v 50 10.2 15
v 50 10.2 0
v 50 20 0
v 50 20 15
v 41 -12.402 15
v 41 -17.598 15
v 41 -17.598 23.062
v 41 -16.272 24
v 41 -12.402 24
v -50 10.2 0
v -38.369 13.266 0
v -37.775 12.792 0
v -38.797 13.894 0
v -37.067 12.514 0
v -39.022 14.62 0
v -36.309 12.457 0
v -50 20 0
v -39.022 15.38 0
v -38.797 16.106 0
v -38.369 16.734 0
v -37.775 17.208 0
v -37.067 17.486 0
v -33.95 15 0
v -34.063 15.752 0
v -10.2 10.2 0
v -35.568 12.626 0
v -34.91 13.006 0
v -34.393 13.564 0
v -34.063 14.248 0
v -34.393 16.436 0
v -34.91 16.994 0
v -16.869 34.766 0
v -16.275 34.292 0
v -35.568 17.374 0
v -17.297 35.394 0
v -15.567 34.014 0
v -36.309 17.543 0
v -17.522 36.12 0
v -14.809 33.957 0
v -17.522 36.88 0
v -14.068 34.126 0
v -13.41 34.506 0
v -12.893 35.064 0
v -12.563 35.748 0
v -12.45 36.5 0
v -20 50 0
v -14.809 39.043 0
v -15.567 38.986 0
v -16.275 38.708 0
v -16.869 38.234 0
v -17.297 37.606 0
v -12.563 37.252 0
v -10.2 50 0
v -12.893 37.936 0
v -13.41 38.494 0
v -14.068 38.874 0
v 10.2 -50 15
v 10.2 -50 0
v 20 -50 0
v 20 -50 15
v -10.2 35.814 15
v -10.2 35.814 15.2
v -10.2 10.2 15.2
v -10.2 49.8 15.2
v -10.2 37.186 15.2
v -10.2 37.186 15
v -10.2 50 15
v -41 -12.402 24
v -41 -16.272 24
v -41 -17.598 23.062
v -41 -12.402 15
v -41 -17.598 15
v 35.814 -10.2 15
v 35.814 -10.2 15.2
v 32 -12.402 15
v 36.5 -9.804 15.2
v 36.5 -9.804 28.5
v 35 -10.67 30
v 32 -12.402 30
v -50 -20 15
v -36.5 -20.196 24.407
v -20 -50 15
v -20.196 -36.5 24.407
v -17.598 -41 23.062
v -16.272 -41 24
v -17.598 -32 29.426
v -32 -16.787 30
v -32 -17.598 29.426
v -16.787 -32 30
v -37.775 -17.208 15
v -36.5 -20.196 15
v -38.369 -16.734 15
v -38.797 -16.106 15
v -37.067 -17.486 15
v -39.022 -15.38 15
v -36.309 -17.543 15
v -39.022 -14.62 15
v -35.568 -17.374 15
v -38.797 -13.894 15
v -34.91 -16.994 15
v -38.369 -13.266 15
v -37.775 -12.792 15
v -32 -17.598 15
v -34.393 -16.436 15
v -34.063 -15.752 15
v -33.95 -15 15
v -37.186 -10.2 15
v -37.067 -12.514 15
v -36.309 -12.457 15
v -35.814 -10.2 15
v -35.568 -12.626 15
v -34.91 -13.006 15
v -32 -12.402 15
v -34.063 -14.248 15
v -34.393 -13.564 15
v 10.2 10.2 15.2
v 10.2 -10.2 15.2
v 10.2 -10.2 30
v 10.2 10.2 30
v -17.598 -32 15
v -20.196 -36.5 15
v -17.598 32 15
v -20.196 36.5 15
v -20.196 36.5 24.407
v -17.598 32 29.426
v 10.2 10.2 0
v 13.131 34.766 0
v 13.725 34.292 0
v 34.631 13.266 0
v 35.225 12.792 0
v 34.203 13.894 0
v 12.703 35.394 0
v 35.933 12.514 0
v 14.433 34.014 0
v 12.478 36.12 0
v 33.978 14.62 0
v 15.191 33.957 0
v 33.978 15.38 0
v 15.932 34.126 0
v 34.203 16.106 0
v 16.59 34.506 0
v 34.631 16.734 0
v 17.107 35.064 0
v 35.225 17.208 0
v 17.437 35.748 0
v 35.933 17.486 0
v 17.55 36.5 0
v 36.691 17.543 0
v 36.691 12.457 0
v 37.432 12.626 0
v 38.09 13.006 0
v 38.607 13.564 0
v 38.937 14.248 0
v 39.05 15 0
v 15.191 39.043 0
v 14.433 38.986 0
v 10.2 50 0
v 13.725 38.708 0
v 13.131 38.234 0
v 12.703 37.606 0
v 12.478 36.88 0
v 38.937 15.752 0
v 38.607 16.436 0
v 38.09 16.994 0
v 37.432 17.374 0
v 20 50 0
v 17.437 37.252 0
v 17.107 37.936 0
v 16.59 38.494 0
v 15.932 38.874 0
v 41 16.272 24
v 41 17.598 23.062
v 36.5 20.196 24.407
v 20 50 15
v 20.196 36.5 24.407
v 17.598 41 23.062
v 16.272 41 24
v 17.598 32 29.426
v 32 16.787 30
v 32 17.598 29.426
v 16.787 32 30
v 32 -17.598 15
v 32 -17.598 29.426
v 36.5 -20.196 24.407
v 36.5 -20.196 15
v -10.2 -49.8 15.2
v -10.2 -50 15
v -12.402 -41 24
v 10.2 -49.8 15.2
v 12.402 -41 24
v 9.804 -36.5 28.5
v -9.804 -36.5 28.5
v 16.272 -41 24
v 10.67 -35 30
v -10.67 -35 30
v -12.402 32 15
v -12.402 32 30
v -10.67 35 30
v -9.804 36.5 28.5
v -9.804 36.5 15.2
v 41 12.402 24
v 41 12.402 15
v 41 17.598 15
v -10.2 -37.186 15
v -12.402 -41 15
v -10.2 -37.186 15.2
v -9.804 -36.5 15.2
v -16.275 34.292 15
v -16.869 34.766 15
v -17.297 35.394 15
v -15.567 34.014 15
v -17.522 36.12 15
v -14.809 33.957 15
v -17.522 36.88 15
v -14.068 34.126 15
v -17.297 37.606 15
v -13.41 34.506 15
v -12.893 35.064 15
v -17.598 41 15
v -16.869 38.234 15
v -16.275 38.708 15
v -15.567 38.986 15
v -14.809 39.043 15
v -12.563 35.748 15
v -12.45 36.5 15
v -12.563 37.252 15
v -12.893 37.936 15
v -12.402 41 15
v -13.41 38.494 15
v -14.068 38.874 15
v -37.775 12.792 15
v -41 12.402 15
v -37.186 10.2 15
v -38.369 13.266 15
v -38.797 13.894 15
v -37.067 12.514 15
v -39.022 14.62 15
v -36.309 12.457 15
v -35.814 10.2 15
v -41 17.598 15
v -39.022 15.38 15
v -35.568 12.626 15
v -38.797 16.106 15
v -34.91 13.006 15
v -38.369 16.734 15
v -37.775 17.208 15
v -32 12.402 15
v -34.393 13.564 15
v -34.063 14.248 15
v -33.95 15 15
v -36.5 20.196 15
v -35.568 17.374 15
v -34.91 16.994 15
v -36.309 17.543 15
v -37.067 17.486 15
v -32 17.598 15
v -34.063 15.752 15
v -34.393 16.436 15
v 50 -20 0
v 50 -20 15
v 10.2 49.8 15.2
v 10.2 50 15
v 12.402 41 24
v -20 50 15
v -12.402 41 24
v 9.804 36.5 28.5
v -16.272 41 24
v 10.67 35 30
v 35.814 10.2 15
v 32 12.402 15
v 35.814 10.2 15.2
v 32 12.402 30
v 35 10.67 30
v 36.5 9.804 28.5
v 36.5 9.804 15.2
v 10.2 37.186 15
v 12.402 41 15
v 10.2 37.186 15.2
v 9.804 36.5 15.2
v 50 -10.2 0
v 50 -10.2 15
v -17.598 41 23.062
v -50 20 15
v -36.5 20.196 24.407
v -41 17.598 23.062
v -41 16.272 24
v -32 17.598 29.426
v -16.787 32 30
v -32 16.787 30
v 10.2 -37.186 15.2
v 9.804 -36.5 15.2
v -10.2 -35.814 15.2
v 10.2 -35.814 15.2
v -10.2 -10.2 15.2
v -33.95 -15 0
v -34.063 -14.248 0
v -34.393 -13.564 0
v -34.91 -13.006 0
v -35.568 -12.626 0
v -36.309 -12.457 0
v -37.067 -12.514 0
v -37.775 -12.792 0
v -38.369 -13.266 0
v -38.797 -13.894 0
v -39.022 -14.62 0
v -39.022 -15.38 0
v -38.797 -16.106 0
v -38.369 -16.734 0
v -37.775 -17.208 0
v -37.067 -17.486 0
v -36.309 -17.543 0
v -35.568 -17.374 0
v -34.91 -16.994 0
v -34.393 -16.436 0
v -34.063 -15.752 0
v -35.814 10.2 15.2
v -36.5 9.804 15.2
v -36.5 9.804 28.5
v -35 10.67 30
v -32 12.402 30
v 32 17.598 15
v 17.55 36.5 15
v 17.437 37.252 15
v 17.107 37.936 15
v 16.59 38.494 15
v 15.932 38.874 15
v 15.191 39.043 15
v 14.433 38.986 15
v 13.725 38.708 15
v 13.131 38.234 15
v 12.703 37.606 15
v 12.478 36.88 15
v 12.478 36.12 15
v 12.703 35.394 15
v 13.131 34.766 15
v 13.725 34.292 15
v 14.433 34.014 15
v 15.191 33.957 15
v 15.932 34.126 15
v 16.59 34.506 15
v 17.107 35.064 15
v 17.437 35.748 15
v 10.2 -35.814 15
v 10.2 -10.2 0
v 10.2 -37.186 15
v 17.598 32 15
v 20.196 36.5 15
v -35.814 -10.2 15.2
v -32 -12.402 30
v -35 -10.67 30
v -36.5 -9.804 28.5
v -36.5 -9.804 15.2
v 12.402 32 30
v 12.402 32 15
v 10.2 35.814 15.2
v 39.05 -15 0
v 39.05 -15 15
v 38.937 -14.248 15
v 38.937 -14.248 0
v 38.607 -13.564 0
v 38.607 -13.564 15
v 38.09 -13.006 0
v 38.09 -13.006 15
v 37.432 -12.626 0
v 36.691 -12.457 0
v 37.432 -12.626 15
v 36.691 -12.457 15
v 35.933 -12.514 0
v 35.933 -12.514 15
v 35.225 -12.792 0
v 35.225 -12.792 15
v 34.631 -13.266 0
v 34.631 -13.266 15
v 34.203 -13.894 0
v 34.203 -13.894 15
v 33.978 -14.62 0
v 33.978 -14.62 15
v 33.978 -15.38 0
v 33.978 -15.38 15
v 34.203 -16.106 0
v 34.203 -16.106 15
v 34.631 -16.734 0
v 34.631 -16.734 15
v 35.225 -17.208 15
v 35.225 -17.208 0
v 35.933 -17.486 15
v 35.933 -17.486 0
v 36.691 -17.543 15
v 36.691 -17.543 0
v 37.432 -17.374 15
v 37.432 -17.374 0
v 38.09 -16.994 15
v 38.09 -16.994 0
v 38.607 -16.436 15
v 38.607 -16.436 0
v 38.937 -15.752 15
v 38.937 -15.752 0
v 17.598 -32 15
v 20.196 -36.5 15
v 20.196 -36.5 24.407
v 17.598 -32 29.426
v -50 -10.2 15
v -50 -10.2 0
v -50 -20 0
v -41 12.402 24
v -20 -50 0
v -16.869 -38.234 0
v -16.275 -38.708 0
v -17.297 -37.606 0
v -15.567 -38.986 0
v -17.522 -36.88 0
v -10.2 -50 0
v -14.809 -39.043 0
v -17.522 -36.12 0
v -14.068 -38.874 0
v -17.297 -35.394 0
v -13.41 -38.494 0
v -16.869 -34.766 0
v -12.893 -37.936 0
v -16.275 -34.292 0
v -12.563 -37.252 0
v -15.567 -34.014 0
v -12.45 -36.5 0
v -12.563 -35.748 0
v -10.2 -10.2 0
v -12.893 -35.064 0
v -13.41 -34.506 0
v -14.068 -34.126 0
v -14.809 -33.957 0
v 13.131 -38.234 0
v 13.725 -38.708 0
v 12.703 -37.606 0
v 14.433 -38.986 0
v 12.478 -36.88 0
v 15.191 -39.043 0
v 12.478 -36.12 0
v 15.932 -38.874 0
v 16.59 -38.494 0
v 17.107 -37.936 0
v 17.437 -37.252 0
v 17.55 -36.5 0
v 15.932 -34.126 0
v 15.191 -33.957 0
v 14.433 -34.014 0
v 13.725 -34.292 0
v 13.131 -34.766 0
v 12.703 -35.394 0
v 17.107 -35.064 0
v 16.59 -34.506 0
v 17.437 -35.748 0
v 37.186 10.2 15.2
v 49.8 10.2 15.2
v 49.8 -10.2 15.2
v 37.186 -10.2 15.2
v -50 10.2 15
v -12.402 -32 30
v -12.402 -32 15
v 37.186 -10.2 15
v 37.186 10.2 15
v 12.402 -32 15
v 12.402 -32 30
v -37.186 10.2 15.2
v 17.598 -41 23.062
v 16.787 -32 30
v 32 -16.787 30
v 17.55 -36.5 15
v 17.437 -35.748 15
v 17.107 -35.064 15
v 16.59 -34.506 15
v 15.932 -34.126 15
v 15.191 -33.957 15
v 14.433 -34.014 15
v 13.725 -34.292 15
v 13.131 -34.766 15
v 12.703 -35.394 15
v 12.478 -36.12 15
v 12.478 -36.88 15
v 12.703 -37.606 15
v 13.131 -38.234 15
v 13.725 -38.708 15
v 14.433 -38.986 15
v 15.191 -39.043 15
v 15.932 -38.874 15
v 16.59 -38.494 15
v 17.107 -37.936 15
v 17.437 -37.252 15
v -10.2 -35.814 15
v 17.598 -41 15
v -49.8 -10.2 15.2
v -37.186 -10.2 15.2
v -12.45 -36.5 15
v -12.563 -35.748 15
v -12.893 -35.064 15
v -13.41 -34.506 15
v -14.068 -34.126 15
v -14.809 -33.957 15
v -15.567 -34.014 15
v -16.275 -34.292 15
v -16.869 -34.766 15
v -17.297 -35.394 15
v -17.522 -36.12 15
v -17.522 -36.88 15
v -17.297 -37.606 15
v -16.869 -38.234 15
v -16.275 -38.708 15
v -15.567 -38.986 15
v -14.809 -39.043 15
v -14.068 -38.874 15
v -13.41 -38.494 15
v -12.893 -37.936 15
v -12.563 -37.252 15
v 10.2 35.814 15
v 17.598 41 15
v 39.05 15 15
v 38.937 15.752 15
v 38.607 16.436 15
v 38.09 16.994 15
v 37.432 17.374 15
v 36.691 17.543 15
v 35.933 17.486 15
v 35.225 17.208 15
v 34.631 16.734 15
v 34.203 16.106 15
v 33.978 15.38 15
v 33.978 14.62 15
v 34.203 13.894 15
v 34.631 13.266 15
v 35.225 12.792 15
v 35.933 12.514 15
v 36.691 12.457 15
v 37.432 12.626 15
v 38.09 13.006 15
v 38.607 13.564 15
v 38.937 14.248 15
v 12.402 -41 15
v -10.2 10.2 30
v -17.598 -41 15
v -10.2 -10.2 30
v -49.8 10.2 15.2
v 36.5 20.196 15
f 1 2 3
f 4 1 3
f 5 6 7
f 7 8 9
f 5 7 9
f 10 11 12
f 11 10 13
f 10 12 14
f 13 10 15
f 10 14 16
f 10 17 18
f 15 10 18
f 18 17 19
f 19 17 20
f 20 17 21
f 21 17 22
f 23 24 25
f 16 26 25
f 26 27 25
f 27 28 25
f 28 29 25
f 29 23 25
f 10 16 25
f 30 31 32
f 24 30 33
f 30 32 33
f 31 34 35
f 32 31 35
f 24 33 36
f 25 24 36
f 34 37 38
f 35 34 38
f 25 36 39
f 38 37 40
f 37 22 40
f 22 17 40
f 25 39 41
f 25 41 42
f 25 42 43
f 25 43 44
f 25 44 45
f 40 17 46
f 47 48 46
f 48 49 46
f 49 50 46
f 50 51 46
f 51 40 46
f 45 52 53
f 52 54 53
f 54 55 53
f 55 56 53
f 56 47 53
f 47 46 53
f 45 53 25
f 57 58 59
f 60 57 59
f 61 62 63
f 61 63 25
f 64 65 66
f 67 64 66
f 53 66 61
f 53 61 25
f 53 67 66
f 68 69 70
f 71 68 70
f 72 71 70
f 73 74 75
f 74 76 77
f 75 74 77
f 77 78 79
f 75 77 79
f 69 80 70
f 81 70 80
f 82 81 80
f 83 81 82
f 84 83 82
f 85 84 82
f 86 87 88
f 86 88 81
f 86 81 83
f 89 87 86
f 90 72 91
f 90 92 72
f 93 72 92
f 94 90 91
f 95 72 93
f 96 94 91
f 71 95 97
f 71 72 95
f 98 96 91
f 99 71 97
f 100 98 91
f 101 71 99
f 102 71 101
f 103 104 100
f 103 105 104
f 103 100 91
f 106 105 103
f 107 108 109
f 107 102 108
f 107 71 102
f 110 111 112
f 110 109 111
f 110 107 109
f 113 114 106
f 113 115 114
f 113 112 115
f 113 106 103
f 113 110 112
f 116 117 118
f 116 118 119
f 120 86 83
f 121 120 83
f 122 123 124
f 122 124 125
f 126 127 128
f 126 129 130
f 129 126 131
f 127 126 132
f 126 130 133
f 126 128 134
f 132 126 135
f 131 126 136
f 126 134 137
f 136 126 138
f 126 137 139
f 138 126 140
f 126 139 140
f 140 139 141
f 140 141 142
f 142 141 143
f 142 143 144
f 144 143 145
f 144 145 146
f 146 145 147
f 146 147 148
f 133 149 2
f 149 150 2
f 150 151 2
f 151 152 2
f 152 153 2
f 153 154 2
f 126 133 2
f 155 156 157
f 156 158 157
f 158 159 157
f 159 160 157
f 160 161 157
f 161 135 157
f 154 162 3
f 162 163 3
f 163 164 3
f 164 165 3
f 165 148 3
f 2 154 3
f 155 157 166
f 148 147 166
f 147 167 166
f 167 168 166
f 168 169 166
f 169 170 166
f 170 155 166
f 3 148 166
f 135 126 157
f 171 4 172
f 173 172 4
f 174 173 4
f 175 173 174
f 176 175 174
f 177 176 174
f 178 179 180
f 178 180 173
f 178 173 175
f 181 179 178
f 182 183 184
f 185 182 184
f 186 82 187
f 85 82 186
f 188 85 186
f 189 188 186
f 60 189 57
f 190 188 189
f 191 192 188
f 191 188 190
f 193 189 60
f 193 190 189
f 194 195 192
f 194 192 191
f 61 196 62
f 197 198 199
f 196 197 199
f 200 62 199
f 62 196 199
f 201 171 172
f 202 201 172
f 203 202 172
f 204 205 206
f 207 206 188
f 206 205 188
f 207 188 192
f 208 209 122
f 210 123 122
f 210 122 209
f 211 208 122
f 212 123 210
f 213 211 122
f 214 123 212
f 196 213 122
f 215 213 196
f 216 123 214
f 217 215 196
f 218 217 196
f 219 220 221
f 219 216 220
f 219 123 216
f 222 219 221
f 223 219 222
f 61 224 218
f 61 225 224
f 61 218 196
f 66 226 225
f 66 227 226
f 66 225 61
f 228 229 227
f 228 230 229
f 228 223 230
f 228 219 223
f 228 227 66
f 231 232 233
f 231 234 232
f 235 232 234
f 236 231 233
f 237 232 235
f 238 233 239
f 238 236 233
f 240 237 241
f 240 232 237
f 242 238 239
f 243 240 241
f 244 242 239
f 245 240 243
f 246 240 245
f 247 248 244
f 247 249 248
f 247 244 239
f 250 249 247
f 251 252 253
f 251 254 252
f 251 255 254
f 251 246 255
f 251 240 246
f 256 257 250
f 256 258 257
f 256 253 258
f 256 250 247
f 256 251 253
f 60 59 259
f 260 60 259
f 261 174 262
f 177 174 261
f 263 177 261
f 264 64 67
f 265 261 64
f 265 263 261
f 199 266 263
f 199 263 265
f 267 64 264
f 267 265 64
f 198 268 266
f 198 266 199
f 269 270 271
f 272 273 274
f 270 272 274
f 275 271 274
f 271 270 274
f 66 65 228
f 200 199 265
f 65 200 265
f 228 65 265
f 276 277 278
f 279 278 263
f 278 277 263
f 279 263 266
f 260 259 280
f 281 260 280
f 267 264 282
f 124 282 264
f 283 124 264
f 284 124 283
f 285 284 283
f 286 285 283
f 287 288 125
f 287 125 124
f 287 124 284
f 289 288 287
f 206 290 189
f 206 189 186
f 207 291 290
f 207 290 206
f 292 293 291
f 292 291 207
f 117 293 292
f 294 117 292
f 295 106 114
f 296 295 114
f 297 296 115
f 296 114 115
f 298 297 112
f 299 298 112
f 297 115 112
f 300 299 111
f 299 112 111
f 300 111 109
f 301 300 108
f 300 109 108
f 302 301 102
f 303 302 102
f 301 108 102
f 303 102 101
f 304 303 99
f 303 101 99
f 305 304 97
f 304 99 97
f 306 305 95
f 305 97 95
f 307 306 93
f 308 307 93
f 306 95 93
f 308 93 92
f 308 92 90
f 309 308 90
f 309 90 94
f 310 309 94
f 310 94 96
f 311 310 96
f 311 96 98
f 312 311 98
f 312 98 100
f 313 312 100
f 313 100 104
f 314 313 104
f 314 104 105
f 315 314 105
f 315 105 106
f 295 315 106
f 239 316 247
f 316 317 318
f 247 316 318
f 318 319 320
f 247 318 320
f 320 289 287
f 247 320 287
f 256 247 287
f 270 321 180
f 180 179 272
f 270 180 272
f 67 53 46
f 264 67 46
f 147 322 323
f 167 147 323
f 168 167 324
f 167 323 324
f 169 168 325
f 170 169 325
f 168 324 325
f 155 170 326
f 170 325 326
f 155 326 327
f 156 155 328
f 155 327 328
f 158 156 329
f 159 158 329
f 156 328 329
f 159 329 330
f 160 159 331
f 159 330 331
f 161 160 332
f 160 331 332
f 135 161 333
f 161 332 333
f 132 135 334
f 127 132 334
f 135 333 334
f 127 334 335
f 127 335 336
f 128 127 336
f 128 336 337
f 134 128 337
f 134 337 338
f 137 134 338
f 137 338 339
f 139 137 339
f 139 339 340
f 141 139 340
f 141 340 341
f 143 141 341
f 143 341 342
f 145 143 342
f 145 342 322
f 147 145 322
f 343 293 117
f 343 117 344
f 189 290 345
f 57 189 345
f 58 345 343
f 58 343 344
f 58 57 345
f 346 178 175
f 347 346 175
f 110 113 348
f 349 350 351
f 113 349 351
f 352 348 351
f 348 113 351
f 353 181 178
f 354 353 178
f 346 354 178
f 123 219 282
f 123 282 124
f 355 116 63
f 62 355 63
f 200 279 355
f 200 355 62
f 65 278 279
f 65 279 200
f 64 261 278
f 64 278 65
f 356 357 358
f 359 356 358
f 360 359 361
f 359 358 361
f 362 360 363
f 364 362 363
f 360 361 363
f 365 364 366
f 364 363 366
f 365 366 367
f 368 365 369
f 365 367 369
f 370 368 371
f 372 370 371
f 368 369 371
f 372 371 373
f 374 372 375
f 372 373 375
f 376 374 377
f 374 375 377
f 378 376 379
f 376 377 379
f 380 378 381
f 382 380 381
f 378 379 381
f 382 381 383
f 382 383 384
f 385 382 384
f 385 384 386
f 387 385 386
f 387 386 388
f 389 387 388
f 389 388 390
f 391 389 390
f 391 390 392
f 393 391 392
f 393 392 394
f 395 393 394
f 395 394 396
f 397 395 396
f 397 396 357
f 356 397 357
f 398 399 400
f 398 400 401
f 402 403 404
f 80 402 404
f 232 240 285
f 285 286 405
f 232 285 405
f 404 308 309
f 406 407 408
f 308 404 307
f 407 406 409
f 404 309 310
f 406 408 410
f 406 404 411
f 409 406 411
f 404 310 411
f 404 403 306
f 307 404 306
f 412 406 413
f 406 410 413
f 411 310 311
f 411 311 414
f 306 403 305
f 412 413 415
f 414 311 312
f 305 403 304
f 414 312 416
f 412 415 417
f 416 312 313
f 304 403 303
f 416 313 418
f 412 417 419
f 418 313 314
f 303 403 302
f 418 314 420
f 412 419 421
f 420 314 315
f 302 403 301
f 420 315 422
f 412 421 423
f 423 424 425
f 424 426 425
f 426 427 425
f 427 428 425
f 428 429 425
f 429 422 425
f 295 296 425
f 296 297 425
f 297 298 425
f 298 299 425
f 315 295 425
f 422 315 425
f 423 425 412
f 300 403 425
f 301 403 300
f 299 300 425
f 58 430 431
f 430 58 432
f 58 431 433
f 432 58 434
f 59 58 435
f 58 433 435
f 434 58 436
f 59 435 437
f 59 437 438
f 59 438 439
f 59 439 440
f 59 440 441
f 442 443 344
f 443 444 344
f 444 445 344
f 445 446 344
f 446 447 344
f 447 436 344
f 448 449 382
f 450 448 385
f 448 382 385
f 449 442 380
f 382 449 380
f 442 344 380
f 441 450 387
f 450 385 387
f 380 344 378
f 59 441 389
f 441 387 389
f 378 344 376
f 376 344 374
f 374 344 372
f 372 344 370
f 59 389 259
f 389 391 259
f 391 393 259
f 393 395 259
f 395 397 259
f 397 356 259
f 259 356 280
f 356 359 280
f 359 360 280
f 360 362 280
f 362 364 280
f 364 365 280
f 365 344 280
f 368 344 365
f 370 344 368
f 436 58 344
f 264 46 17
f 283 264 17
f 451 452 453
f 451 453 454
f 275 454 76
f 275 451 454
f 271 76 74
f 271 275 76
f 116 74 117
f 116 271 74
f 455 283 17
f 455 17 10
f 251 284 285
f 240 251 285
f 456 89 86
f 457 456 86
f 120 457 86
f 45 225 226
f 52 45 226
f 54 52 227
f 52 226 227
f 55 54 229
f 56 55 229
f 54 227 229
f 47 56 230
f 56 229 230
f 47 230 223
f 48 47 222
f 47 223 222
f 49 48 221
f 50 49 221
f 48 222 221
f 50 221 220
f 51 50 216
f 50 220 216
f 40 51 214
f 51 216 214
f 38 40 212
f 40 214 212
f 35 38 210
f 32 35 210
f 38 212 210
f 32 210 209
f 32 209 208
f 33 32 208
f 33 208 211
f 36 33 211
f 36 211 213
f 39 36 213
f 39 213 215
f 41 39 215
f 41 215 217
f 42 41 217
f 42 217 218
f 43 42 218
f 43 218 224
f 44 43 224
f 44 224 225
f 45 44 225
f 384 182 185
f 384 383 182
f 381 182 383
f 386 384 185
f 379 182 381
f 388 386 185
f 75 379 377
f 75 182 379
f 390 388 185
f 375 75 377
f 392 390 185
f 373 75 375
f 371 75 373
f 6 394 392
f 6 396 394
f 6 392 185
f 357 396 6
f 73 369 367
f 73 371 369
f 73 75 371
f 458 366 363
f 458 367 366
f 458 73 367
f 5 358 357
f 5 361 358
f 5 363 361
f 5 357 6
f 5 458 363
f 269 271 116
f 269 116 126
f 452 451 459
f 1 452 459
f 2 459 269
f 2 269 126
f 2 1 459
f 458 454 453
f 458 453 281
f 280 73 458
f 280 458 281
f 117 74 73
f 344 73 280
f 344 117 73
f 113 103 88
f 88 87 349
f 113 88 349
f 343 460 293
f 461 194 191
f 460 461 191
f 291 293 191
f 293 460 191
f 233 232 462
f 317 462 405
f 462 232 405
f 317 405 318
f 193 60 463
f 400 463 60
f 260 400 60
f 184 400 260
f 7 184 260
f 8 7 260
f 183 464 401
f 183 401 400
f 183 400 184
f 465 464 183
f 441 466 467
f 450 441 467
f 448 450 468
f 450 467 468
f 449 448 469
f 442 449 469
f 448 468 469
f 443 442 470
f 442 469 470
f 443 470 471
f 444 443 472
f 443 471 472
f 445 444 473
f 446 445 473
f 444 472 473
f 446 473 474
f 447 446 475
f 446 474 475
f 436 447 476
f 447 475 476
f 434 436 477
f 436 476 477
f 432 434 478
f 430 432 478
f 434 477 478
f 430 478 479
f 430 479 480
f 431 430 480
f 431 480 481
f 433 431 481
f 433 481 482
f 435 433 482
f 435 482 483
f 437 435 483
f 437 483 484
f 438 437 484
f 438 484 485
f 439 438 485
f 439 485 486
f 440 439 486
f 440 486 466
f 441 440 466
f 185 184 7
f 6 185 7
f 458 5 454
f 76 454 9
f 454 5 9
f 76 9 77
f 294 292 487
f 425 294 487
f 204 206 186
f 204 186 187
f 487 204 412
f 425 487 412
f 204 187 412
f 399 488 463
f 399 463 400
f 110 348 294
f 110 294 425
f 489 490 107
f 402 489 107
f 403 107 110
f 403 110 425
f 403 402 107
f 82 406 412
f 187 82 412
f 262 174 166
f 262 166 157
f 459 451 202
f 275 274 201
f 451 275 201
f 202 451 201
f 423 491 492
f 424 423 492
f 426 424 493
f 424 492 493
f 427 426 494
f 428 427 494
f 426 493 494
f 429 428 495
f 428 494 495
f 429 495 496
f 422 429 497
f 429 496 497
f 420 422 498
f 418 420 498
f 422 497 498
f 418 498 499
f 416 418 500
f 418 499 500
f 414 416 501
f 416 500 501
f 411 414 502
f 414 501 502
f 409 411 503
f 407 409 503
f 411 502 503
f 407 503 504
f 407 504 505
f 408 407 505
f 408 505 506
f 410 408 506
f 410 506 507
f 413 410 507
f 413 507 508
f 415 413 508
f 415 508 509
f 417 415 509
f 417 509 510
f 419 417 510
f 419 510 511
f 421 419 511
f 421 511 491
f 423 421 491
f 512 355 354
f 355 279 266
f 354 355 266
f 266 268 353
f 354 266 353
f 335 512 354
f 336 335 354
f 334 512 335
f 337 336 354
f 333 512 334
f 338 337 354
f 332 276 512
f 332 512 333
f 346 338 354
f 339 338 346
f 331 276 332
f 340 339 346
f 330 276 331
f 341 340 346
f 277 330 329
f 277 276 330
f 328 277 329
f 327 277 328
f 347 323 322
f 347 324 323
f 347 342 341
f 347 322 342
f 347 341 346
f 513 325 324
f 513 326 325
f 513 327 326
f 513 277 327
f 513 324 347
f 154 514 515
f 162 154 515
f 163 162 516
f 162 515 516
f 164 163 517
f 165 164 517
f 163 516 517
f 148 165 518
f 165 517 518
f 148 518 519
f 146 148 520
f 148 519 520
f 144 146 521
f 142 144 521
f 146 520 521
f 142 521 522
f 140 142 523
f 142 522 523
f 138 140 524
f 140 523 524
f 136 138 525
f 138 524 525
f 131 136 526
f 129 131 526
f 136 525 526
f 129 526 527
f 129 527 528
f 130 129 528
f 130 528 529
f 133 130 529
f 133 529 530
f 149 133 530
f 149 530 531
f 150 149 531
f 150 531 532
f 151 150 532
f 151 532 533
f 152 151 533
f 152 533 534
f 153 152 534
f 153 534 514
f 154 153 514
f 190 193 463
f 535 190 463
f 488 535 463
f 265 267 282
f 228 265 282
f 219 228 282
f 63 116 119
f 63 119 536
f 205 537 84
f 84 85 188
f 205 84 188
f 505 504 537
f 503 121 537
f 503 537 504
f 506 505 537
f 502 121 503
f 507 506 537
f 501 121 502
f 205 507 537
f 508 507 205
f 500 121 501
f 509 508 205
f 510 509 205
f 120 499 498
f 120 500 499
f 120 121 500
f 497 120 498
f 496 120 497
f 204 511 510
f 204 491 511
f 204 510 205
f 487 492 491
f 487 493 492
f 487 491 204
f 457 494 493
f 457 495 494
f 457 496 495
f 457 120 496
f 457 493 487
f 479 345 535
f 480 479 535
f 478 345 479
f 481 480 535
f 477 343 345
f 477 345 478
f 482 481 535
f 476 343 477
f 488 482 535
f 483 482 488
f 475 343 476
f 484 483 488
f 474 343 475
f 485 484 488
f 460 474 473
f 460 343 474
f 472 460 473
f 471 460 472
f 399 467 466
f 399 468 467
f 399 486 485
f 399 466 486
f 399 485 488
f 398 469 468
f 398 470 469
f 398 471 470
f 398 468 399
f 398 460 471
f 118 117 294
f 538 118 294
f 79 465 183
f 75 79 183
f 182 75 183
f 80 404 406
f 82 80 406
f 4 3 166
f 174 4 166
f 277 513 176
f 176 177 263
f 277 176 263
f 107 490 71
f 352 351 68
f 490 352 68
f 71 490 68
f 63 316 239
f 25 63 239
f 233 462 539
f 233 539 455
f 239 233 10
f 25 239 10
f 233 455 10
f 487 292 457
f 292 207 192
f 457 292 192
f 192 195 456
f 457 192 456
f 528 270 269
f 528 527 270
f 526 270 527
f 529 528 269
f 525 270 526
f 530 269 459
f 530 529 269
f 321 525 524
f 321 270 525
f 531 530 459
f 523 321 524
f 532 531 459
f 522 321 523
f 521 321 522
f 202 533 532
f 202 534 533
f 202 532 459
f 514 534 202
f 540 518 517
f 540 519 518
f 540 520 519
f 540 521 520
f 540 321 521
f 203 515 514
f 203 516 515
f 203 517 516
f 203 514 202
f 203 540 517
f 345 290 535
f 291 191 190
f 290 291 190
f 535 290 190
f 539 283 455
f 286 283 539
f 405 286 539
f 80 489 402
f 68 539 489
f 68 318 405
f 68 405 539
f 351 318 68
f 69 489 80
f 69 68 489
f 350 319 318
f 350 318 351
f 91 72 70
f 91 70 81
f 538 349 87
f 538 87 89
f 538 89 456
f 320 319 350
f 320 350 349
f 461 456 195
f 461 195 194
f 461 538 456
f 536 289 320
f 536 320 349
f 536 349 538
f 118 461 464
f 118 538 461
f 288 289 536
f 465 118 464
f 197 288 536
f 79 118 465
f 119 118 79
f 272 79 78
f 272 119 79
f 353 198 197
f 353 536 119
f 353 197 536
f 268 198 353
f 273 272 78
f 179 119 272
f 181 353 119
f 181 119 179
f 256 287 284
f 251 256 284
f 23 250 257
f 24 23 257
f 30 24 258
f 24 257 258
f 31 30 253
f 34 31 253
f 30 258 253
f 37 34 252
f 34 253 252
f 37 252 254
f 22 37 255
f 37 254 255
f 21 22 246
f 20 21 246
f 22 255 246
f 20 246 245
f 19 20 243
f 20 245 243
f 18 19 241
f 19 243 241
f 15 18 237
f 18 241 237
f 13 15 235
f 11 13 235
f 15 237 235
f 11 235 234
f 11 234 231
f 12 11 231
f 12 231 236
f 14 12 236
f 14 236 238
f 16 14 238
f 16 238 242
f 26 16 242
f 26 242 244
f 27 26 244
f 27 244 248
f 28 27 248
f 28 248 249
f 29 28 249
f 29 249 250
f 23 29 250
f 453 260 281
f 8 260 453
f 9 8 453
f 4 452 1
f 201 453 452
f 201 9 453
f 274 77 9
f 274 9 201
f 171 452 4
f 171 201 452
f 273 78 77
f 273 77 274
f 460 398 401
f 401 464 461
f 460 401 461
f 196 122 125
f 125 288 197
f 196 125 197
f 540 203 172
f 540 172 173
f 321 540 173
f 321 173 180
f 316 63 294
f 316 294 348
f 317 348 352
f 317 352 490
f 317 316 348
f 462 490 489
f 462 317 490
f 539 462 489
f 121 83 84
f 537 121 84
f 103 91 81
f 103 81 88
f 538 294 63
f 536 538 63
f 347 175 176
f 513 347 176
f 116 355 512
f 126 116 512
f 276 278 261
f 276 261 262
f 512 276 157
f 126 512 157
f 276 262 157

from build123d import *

# Parameters (mm, degrees)
EXTRUDE_1_DEPTH          = 30
CHAMFER_1_SIZE           = 15
SKETCH_2_W               = 15.2
SKETCH_2_H               = 20.4
CUT_EXTRUDE_1_DEPTH      = 50
SKETCH_3_R               = 2.55
CUT_EXTRUDE_2_DEPTH      = 77.811457479
CUT_EXTRUDE_3_DEPTH      = 15
PATTERN_CIRCULAR_1_COUNT = 4
SKETCH_6_W               = 20.4
SKETCH_6_H               = 20.4
CUT_EXTRUDE_4_DEPTH      = 73.325928961


with BuildPart() as part:
    # 스케치1 → 보스-돌출1 (new body)
    with BuildSketch(Plane.XY):
        Polygon((-20, 50), (-50, 20), (-50, -20), (-20, -50), (20, -50), (50, -20), (50, 20), (20, 50), align=None)
    extrude(amount=EXTRUDE_1_DEPTH)

    # 모따기1
    chamfer_1_edges = [part.edges().sort_by_distance(p)[0] for p in [
        (-50, 0, 30),
        (-35, -35, 30),
        (0, -50, 30),
        (35, -35, 30),
        (50, 0, 30),
        (35, 35, 30),
        (0, 50, 30),
        (-35, 35, 30),
    ]]
    chamfer(chamfer_1_edges, length=CHAMFER_1_SIZE)

    # 스케치2 → 컷-돌출1 (cut)
    with BuildSketch(Plane(origin=(50, 0, 0), x_dir=(0, 0, -1), z_dir=(1, 0, 0))):
        with Locations((-7.6, 0)):
            Rectangle(SKETCH_2_W, SKETCH_2_H)
    cut_extrude_1 = extrude(amount=-CUT_EXTRUDE_1_DEPTH, mode=Mode.SUBTRACT)

    # 스케치3 → 컷-돌출2 (cut, through all)
    with BuildSketch(Plane.XY.offset(30)):
        with Locations((36.5, -15)):
            Circle(SKETCH_3_R)
        with Locations((36.5, 15)):
            Circle(SKETCH_3_R)
        with Locations((-15, -36.5)):
            Circle(SKETCH_3_R)
        with Locations((15, -36.5)):
            Circle(SKETCH_3_R)
        with Locations((-36.5, 15)):
            Circle(SKETCH_3_R)
        with Locations((-36.5, -15)):
            Circle(SKETCH_3_R)
        with Locations((15, 36.5)):
            Circle(SKETCH_3_R)
        with Locations((-15, 36.5)):
            Circle(SKETCH_3_R)
    extrude(amount=-CUT_EXTRUDE_2_DEPTH, mode=Mode.SUBTRACT)

    # 스케치4 → 컷-돌출3 (cut)
    with BuildSketch(Plane.XY.offset(30)):
        Polygon((-12.401923789, -32), (-17.598076211, -32), (-20.196152423, -36.5), (-17.598076211, -41), (-12.401923789, -41), (-9.803847577, -36.5), align=None)
        Polygon((32, -12.401923789), (32, -17.598076211), (36.5, -20.196152423), (41, -17.598076211), (41, -12.401923789), (36.5, -9.803847577), align=None)
        Polygon((36.5, 9.803847577), (41, 12.401923789), (41, 17.598076211), (36.5, 20.196152423), (32, 17.598076211), (32, 12.401923789), align=None)
        Polygon((9.803847577, -36.5), (12.401923789, -41), (17.598076211, -41), (20.196152423, -36.5), (17.598076211, -32), (12.401923789, -32), align=None)
        Polygon((-32, 12.401923789), (-32, 17.598076211), (-36.5, 20.196152423), (-41, 17.598076211), (-41, 12.401923789), (-36.5, 9.803847577), align=None)
        Polygon((-36.5, -9.803847577), (-41, -12.401923789), (-41, -17.598076211), (-36.5, -20.196152423), (-32, -17.598076211), (-32, -12.401923789), align=None)
        Polygon((12.401923789, 32), (17.598076211, 32), (20.196152423, 36.5), (17.598076211, 41), (12.401923789, 41), (9.803847577, 36.5), align=None)
        Polygon((-9.803847577, 36.5), (-12.401923789, 41), (-17.598076211, 41), (-20.196152423, 36.5), (-17.598076211, 32), (-12.401923789, 32), align=None)
    extrude(amount=-CUT_EXTRUDE_3_DEPTH, mode=Mode.SUBTRACT)

    # 원형 패턴1: 컷-돌출1 ×4 about axis
    pattern_circular_1_axis = Axis((0, 0, 0), (0, 0, 1))
    for i in range(1, PATTERN_CIRCULAR_1_COUNT):
        add(cut_extrude_1.rotate(pattern_circular_1_axis, i * 360 / PATTERN_CIRCULAR_1_COUNT), mode=Mode.SUBTRACT)

    # 스케치6 → 컷-돌출4 (cut, through all)
    with BuildSketch(Plane(origin=(0, 0, 15.2), x_dir=(-1, 0, 0), z_dir=(0, 0, -1))):
        Rectangle(SKETCH_6_W, SKETCH_6_H)
    extrude(amount=-CUT_EXTRUDE_4_DEPTH, mode=Mode.SUBTRACT)


solid = part.part
